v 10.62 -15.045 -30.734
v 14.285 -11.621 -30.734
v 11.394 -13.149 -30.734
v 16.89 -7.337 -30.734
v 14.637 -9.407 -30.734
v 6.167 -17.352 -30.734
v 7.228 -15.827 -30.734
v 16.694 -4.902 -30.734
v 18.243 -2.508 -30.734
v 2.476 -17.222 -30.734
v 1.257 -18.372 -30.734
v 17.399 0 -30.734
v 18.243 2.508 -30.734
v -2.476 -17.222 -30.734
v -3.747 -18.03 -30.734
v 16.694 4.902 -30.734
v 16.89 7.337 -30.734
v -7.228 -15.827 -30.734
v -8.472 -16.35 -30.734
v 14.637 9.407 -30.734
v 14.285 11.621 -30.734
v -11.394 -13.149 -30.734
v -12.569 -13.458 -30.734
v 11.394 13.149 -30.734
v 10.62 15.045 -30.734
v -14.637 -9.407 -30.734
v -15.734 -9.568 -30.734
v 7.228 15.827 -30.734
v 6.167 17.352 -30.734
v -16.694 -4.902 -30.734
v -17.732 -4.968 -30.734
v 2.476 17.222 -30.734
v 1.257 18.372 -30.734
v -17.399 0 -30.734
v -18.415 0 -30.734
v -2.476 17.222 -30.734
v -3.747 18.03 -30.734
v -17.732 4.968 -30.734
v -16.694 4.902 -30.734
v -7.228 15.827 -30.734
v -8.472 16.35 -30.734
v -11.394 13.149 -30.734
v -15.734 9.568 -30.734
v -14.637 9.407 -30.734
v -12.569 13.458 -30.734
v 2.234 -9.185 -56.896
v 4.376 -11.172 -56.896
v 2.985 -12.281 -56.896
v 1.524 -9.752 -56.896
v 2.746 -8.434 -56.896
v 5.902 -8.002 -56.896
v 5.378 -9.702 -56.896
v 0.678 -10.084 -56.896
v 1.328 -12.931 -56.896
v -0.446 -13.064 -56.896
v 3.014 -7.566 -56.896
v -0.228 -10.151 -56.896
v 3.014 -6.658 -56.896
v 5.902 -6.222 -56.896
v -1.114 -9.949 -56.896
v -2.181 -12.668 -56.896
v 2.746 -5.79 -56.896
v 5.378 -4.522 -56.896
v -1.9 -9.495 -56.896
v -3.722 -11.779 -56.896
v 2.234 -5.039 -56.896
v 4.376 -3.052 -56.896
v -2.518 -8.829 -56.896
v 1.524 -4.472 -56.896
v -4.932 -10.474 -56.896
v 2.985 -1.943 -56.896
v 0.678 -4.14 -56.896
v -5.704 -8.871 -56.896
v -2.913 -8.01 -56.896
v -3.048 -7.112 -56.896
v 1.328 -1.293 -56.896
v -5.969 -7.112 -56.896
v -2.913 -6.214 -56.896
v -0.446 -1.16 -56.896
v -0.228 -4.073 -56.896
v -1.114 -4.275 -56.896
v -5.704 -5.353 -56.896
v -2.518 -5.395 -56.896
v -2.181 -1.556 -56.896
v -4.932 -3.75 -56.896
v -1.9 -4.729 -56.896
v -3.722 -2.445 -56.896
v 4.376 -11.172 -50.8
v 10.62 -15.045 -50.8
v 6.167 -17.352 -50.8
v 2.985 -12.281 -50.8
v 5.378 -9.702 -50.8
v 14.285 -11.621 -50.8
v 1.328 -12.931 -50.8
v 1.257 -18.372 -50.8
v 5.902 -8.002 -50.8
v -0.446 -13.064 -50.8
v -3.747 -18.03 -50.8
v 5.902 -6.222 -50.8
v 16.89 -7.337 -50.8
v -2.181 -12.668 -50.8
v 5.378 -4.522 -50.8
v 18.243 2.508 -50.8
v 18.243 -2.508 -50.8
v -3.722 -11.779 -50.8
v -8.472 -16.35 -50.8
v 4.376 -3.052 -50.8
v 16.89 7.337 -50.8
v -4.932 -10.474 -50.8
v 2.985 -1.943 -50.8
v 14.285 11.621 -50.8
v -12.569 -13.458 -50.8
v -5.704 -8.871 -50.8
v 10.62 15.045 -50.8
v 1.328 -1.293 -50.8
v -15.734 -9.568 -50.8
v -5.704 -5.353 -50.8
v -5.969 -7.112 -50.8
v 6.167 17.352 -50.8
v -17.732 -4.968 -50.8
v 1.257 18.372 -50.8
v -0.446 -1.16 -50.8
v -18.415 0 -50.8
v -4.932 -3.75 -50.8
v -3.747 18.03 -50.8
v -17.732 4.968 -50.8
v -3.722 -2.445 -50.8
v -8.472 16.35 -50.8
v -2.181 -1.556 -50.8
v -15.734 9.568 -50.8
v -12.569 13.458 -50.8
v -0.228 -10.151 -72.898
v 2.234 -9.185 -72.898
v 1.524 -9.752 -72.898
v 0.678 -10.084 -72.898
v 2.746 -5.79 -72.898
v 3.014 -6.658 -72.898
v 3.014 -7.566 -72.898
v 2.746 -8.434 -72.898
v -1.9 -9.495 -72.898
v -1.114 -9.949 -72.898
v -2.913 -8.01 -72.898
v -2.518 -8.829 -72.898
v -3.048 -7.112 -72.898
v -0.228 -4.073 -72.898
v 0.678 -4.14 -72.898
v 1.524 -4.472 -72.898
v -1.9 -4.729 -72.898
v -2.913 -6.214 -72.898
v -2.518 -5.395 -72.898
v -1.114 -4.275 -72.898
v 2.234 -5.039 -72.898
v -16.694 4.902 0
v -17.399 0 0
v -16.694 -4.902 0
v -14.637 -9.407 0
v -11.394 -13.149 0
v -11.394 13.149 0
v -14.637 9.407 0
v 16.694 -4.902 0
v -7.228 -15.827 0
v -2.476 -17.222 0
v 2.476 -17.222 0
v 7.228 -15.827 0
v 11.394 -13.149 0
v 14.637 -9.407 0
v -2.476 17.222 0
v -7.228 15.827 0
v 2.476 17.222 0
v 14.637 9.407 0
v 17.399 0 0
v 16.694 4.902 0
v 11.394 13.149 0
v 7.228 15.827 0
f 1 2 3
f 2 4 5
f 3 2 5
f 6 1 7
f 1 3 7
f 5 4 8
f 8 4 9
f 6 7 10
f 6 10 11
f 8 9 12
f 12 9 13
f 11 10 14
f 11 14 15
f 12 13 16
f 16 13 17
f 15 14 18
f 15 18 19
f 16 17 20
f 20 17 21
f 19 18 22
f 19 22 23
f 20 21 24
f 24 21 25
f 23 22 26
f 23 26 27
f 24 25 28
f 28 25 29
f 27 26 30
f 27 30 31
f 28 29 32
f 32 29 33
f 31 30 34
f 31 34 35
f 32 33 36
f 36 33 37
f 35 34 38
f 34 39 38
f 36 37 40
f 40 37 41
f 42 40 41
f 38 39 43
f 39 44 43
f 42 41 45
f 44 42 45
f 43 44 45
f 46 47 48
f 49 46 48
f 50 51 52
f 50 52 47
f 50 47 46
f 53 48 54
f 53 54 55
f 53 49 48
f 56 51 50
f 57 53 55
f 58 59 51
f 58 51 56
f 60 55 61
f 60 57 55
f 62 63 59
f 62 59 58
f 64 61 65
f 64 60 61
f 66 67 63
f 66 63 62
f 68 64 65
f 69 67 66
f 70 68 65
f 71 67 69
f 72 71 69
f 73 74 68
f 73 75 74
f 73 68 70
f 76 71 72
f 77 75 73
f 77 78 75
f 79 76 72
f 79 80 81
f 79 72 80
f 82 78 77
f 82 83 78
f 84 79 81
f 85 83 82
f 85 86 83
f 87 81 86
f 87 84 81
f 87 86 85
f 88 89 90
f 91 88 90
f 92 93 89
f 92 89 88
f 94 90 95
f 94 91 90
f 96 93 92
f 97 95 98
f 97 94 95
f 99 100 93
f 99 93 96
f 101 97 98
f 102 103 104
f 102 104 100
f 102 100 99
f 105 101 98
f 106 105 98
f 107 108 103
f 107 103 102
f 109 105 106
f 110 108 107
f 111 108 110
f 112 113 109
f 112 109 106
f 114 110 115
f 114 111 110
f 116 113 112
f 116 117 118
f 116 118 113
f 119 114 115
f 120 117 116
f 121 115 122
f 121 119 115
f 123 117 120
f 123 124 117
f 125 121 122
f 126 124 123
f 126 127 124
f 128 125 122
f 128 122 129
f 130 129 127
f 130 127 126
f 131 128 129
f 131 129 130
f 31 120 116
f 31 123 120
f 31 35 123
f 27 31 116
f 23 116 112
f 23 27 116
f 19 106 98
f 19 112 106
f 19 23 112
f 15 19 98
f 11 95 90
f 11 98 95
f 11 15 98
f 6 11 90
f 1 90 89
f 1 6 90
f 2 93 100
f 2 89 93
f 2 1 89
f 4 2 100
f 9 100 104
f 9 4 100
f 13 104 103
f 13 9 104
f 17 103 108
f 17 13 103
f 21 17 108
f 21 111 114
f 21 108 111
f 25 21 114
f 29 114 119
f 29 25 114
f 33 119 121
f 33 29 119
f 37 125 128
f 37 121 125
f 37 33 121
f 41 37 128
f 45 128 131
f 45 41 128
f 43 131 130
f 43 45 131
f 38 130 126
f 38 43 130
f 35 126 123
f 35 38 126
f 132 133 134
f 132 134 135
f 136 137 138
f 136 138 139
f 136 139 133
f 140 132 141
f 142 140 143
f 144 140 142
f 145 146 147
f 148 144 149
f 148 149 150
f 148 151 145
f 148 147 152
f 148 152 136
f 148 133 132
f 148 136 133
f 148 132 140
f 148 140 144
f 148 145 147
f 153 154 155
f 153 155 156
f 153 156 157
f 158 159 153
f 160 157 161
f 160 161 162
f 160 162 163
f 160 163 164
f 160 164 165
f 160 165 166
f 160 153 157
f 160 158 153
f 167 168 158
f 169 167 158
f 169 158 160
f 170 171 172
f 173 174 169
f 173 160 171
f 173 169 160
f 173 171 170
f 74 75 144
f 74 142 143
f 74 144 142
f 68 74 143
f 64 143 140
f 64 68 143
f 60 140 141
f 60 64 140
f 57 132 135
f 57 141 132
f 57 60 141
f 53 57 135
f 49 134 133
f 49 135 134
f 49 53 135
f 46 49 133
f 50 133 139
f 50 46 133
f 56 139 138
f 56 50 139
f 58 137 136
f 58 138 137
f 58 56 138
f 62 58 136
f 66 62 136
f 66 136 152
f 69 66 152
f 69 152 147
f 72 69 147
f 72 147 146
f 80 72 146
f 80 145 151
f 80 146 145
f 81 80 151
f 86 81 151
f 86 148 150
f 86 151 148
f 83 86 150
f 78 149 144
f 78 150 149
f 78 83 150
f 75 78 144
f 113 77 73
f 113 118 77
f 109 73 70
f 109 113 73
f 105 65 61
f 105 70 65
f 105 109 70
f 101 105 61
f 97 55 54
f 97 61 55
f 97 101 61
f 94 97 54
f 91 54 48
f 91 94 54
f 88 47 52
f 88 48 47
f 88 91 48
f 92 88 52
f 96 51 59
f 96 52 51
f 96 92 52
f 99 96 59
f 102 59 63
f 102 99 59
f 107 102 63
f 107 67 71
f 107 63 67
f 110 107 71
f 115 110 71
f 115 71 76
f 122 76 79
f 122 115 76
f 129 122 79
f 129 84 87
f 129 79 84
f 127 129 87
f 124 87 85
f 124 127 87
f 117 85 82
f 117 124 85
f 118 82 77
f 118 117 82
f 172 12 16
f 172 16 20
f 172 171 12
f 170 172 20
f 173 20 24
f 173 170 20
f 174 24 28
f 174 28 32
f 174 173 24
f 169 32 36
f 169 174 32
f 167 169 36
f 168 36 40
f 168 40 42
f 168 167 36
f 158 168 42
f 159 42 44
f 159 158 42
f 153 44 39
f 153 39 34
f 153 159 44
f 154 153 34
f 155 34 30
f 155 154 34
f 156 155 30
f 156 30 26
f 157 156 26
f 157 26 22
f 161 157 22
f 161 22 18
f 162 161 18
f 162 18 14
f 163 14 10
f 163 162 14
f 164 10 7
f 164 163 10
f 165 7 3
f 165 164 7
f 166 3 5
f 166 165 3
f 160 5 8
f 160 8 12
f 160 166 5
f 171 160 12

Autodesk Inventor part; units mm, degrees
ref_plane "YZ Plane" through (0, 0, 0) normal (1, 0, 0) x (0, 1, 0)
ref_plane "XZ Plane" through (0, 0, 0) normal (0, 1, 0) x (-1, 0, 0)
ref_plane "XY Plane" through (0, 0, 0) normal (0, 0, 1) x (1, 0, 0)
sketch "Sketch1" plane through (0, 0, 0) normal (0, 0, 1) x (1, 0, 0)
  circle A0 centre (0, 0) radius 17.399
  dimension "d0" = 34.798
extrude "Extrusion1" add sketch "Sketch1" against normal blind 30.734
sketch "Sketch2" plane through (0, 0, -30.734) normal (0, 0, -1) x (-1, 0, 0)
  circle A0 centre (0, 0) radius 18.415
  dimension "d3" = 36.83
extrude "Extrusion2" add sketch "Sketch2" along normal blind 20.066
sketch "Sketch3" plane through (0, 0, -50.8) normal (0, 0, -1) x (-1, 0, 0)
  line L0 (0, 0) -> (0, -7.112) construction
  circle A0 centre (0, -7.112) radius 5.969
  dimension "d6" = 7.112
  dimension "d7" = 11.938
extrude "Extrusion3" add sketch "Sketch3" along normal blind 6.096
sketch "Sketch4" plane through (0, -7.112, -56.896) normal (0, 0, -1) x (-1, 0, 0)
  circle A0 centre (0, 0) radius 3.048
  point P0 (0, 7.112)
  dimension "d10" = 6.096
extrude "Extrusion4" add sketch "Sketch4" along normal blind 16.002
properties part number "ShootingMech_Moter"
